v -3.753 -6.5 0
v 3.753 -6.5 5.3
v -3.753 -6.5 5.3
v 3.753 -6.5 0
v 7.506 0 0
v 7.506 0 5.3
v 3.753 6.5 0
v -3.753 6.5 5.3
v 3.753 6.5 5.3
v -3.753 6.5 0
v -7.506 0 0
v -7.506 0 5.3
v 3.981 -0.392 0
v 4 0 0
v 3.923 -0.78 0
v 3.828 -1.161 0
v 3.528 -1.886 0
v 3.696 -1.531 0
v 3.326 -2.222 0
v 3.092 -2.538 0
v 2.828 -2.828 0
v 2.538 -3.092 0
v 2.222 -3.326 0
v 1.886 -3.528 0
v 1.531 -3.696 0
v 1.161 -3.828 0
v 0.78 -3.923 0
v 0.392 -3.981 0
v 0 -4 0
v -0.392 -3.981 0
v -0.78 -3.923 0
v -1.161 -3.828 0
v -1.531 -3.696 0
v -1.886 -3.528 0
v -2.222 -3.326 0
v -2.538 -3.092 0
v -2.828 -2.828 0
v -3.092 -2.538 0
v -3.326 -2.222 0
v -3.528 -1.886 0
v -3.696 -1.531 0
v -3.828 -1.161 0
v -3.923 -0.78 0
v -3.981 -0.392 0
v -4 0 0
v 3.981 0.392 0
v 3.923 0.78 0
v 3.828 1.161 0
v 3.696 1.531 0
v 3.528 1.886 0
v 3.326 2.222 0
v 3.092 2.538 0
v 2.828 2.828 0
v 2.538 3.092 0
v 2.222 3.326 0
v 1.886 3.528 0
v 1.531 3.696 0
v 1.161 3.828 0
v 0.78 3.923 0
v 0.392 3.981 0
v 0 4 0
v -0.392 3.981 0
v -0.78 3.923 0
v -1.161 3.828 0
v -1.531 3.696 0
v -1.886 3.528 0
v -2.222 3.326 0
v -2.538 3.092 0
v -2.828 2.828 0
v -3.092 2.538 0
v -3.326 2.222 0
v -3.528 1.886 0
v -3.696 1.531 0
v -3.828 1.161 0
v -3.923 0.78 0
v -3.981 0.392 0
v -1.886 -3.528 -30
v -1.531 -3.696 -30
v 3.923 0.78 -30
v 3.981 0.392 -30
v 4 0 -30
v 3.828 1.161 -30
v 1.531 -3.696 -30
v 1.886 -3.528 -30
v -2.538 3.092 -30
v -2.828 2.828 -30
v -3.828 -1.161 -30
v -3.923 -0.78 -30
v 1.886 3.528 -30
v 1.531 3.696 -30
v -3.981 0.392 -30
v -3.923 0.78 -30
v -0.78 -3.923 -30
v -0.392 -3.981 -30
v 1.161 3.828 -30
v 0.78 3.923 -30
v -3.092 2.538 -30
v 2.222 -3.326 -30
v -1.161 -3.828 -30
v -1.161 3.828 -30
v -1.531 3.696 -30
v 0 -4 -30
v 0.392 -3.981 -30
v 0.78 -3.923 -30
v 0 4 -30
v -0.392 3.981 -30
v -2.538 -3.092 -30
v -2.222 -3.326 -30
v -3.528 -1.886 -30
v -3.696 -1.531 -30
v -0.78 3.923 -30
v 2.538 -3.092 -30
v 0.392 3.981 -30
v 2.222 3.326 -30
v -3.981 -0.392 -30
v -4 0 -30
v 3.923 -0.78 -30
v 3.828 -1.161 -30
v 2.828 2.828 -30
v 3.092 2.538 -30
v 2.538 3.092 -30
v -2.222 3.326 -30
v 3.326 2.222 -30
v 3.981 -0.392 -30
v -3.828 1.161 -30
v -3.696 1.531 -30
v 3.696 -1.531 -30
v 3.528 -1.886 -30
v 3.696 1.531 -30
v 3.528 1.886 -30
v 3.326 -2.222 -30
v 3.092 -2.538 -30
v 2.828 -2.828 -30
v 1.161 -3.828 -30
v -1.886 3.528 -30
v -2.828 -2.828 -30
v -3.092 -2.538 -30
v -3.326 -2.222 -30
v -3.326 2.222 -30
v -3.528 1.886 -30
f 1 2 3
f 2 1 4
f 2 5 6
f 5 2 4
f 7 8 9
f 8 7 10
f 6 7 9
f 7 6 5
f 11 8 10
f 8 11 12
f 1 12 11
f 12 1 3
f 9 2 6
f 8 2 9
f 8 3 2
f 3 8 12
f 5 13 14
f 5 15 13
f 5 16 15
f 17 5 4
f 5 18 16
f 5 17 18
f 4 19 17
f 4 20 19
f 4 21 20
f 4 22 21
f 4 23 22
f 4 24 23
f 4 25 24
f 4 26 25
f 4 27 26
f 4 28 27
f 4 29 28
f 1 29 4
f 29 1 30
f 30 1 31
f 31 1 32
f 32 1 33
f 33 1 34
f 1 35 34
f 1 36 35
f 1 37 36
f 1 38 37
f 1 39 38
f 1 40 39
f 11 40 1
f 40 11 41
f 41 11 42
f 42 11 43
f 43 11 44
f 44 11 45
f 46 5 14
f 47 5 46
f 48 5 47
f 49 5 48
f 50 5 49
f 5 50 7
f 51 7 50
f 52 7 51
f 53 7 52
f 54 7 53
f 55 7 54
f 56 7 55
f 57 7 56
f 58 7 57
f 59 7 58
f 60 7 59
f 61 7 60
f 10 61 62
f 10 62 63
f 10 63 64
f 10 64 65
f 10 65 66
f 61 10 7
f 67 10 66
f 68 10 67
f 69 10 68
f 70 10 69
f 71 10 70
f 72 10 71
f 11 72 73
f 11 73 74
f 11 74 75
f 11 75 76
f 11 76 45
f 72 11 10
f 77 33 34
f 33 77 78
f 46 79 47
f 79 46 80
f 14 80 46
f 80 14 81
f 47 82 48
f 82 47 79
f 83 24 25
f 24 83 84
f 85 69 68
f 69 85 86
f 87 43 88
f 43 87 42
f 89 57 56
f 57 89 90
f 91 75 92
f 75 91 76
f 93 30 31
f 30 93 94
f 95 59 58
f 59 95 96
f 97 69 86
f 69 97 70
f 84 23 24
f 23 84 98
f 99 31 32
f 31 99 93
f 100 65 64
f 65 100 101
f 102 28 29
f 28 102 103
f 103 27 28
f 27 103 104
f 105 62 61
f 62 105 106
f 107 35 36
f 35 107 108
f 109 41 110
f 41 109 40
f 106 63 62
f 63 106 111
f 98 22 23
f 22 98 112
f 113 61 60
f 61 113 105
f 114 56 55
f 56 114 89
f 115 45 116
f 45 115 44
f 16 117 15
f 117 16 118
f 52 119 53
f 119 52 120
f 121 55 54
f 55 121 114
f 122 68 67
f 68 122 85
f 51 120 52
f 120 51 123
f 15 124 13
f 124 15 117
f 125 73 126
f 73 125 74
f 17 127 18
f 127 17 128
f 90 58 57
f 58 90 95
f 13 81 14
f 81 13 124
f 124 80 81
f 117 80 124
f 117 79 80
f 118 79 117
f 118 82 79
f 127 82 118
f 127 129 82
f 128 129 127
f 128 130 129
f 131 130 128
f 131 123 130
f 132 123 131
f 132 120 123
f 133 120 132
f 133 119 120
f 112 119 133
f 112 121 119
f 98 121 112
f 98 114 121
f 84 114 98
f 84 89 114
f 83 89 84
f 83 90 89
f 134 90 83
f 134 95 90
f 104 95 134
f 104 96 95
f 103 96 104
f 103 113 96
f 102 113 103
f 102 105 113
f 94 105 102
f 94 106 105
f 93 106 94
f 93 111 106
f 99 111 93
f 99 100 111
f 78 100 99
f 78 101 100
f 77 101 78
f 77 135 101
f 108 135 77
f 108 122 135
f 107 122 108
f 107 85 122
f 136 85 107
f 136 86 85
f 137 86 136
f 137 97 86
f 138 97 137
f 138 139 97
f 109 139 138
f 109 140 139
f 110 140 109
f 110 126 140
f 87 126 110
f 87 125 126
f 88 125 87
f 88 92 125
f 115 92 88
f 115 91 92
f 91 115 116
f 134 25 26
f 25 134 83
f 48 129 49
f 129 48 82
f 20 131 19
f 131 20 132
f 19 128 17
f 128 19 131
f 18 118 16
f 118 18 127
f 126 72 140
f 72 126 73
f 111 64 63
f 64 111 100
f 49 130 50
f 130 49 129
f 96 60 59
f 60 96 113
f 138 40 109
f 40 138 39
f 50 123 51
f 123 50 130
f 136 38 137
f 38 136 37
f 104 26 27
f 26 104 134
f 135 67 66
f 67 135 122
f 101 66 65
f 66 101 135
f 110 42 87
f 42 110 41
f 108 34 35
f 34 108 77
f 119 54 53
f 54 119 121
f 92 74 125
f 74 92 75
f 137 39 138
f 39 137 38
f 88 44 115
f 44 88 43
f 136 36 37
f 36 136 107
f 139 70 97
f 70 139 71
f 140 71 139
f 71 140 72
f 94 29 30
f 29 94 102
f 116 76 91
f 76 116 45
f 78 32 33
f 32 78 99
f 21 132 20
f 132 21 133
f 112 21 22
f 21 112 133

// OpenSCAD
// M8 六角ボルト(ねじ山省略、円柱シャンク)

// パラメータ
af = 13;    // 頭部 対辺距離 (across-flats) [mm]
hh = 5.3;   // 頭部 高さ [mm]
sd = 8;     // シャンク直径 [mm]
sl = 30;    // シャンク長さ [mm]

$fn = 64;   // 円柱の滑らかさ

module hex_bolt() {
    union() {
        // 頭部: 六角柱(底面 z=0、上面 z=hh)
        // $fn=6 の cylinder は外接円基準なので、対辺距離から外接円直径へ変換
        cylinder(h = hh, d = af / cos(30), $fn = 6);

        // シャンク: z=-sl から z=0 まで
        translate([0, 0, -sl])
            cylinder(h = sl, d = sd);
    }
}

hex_bolt();
